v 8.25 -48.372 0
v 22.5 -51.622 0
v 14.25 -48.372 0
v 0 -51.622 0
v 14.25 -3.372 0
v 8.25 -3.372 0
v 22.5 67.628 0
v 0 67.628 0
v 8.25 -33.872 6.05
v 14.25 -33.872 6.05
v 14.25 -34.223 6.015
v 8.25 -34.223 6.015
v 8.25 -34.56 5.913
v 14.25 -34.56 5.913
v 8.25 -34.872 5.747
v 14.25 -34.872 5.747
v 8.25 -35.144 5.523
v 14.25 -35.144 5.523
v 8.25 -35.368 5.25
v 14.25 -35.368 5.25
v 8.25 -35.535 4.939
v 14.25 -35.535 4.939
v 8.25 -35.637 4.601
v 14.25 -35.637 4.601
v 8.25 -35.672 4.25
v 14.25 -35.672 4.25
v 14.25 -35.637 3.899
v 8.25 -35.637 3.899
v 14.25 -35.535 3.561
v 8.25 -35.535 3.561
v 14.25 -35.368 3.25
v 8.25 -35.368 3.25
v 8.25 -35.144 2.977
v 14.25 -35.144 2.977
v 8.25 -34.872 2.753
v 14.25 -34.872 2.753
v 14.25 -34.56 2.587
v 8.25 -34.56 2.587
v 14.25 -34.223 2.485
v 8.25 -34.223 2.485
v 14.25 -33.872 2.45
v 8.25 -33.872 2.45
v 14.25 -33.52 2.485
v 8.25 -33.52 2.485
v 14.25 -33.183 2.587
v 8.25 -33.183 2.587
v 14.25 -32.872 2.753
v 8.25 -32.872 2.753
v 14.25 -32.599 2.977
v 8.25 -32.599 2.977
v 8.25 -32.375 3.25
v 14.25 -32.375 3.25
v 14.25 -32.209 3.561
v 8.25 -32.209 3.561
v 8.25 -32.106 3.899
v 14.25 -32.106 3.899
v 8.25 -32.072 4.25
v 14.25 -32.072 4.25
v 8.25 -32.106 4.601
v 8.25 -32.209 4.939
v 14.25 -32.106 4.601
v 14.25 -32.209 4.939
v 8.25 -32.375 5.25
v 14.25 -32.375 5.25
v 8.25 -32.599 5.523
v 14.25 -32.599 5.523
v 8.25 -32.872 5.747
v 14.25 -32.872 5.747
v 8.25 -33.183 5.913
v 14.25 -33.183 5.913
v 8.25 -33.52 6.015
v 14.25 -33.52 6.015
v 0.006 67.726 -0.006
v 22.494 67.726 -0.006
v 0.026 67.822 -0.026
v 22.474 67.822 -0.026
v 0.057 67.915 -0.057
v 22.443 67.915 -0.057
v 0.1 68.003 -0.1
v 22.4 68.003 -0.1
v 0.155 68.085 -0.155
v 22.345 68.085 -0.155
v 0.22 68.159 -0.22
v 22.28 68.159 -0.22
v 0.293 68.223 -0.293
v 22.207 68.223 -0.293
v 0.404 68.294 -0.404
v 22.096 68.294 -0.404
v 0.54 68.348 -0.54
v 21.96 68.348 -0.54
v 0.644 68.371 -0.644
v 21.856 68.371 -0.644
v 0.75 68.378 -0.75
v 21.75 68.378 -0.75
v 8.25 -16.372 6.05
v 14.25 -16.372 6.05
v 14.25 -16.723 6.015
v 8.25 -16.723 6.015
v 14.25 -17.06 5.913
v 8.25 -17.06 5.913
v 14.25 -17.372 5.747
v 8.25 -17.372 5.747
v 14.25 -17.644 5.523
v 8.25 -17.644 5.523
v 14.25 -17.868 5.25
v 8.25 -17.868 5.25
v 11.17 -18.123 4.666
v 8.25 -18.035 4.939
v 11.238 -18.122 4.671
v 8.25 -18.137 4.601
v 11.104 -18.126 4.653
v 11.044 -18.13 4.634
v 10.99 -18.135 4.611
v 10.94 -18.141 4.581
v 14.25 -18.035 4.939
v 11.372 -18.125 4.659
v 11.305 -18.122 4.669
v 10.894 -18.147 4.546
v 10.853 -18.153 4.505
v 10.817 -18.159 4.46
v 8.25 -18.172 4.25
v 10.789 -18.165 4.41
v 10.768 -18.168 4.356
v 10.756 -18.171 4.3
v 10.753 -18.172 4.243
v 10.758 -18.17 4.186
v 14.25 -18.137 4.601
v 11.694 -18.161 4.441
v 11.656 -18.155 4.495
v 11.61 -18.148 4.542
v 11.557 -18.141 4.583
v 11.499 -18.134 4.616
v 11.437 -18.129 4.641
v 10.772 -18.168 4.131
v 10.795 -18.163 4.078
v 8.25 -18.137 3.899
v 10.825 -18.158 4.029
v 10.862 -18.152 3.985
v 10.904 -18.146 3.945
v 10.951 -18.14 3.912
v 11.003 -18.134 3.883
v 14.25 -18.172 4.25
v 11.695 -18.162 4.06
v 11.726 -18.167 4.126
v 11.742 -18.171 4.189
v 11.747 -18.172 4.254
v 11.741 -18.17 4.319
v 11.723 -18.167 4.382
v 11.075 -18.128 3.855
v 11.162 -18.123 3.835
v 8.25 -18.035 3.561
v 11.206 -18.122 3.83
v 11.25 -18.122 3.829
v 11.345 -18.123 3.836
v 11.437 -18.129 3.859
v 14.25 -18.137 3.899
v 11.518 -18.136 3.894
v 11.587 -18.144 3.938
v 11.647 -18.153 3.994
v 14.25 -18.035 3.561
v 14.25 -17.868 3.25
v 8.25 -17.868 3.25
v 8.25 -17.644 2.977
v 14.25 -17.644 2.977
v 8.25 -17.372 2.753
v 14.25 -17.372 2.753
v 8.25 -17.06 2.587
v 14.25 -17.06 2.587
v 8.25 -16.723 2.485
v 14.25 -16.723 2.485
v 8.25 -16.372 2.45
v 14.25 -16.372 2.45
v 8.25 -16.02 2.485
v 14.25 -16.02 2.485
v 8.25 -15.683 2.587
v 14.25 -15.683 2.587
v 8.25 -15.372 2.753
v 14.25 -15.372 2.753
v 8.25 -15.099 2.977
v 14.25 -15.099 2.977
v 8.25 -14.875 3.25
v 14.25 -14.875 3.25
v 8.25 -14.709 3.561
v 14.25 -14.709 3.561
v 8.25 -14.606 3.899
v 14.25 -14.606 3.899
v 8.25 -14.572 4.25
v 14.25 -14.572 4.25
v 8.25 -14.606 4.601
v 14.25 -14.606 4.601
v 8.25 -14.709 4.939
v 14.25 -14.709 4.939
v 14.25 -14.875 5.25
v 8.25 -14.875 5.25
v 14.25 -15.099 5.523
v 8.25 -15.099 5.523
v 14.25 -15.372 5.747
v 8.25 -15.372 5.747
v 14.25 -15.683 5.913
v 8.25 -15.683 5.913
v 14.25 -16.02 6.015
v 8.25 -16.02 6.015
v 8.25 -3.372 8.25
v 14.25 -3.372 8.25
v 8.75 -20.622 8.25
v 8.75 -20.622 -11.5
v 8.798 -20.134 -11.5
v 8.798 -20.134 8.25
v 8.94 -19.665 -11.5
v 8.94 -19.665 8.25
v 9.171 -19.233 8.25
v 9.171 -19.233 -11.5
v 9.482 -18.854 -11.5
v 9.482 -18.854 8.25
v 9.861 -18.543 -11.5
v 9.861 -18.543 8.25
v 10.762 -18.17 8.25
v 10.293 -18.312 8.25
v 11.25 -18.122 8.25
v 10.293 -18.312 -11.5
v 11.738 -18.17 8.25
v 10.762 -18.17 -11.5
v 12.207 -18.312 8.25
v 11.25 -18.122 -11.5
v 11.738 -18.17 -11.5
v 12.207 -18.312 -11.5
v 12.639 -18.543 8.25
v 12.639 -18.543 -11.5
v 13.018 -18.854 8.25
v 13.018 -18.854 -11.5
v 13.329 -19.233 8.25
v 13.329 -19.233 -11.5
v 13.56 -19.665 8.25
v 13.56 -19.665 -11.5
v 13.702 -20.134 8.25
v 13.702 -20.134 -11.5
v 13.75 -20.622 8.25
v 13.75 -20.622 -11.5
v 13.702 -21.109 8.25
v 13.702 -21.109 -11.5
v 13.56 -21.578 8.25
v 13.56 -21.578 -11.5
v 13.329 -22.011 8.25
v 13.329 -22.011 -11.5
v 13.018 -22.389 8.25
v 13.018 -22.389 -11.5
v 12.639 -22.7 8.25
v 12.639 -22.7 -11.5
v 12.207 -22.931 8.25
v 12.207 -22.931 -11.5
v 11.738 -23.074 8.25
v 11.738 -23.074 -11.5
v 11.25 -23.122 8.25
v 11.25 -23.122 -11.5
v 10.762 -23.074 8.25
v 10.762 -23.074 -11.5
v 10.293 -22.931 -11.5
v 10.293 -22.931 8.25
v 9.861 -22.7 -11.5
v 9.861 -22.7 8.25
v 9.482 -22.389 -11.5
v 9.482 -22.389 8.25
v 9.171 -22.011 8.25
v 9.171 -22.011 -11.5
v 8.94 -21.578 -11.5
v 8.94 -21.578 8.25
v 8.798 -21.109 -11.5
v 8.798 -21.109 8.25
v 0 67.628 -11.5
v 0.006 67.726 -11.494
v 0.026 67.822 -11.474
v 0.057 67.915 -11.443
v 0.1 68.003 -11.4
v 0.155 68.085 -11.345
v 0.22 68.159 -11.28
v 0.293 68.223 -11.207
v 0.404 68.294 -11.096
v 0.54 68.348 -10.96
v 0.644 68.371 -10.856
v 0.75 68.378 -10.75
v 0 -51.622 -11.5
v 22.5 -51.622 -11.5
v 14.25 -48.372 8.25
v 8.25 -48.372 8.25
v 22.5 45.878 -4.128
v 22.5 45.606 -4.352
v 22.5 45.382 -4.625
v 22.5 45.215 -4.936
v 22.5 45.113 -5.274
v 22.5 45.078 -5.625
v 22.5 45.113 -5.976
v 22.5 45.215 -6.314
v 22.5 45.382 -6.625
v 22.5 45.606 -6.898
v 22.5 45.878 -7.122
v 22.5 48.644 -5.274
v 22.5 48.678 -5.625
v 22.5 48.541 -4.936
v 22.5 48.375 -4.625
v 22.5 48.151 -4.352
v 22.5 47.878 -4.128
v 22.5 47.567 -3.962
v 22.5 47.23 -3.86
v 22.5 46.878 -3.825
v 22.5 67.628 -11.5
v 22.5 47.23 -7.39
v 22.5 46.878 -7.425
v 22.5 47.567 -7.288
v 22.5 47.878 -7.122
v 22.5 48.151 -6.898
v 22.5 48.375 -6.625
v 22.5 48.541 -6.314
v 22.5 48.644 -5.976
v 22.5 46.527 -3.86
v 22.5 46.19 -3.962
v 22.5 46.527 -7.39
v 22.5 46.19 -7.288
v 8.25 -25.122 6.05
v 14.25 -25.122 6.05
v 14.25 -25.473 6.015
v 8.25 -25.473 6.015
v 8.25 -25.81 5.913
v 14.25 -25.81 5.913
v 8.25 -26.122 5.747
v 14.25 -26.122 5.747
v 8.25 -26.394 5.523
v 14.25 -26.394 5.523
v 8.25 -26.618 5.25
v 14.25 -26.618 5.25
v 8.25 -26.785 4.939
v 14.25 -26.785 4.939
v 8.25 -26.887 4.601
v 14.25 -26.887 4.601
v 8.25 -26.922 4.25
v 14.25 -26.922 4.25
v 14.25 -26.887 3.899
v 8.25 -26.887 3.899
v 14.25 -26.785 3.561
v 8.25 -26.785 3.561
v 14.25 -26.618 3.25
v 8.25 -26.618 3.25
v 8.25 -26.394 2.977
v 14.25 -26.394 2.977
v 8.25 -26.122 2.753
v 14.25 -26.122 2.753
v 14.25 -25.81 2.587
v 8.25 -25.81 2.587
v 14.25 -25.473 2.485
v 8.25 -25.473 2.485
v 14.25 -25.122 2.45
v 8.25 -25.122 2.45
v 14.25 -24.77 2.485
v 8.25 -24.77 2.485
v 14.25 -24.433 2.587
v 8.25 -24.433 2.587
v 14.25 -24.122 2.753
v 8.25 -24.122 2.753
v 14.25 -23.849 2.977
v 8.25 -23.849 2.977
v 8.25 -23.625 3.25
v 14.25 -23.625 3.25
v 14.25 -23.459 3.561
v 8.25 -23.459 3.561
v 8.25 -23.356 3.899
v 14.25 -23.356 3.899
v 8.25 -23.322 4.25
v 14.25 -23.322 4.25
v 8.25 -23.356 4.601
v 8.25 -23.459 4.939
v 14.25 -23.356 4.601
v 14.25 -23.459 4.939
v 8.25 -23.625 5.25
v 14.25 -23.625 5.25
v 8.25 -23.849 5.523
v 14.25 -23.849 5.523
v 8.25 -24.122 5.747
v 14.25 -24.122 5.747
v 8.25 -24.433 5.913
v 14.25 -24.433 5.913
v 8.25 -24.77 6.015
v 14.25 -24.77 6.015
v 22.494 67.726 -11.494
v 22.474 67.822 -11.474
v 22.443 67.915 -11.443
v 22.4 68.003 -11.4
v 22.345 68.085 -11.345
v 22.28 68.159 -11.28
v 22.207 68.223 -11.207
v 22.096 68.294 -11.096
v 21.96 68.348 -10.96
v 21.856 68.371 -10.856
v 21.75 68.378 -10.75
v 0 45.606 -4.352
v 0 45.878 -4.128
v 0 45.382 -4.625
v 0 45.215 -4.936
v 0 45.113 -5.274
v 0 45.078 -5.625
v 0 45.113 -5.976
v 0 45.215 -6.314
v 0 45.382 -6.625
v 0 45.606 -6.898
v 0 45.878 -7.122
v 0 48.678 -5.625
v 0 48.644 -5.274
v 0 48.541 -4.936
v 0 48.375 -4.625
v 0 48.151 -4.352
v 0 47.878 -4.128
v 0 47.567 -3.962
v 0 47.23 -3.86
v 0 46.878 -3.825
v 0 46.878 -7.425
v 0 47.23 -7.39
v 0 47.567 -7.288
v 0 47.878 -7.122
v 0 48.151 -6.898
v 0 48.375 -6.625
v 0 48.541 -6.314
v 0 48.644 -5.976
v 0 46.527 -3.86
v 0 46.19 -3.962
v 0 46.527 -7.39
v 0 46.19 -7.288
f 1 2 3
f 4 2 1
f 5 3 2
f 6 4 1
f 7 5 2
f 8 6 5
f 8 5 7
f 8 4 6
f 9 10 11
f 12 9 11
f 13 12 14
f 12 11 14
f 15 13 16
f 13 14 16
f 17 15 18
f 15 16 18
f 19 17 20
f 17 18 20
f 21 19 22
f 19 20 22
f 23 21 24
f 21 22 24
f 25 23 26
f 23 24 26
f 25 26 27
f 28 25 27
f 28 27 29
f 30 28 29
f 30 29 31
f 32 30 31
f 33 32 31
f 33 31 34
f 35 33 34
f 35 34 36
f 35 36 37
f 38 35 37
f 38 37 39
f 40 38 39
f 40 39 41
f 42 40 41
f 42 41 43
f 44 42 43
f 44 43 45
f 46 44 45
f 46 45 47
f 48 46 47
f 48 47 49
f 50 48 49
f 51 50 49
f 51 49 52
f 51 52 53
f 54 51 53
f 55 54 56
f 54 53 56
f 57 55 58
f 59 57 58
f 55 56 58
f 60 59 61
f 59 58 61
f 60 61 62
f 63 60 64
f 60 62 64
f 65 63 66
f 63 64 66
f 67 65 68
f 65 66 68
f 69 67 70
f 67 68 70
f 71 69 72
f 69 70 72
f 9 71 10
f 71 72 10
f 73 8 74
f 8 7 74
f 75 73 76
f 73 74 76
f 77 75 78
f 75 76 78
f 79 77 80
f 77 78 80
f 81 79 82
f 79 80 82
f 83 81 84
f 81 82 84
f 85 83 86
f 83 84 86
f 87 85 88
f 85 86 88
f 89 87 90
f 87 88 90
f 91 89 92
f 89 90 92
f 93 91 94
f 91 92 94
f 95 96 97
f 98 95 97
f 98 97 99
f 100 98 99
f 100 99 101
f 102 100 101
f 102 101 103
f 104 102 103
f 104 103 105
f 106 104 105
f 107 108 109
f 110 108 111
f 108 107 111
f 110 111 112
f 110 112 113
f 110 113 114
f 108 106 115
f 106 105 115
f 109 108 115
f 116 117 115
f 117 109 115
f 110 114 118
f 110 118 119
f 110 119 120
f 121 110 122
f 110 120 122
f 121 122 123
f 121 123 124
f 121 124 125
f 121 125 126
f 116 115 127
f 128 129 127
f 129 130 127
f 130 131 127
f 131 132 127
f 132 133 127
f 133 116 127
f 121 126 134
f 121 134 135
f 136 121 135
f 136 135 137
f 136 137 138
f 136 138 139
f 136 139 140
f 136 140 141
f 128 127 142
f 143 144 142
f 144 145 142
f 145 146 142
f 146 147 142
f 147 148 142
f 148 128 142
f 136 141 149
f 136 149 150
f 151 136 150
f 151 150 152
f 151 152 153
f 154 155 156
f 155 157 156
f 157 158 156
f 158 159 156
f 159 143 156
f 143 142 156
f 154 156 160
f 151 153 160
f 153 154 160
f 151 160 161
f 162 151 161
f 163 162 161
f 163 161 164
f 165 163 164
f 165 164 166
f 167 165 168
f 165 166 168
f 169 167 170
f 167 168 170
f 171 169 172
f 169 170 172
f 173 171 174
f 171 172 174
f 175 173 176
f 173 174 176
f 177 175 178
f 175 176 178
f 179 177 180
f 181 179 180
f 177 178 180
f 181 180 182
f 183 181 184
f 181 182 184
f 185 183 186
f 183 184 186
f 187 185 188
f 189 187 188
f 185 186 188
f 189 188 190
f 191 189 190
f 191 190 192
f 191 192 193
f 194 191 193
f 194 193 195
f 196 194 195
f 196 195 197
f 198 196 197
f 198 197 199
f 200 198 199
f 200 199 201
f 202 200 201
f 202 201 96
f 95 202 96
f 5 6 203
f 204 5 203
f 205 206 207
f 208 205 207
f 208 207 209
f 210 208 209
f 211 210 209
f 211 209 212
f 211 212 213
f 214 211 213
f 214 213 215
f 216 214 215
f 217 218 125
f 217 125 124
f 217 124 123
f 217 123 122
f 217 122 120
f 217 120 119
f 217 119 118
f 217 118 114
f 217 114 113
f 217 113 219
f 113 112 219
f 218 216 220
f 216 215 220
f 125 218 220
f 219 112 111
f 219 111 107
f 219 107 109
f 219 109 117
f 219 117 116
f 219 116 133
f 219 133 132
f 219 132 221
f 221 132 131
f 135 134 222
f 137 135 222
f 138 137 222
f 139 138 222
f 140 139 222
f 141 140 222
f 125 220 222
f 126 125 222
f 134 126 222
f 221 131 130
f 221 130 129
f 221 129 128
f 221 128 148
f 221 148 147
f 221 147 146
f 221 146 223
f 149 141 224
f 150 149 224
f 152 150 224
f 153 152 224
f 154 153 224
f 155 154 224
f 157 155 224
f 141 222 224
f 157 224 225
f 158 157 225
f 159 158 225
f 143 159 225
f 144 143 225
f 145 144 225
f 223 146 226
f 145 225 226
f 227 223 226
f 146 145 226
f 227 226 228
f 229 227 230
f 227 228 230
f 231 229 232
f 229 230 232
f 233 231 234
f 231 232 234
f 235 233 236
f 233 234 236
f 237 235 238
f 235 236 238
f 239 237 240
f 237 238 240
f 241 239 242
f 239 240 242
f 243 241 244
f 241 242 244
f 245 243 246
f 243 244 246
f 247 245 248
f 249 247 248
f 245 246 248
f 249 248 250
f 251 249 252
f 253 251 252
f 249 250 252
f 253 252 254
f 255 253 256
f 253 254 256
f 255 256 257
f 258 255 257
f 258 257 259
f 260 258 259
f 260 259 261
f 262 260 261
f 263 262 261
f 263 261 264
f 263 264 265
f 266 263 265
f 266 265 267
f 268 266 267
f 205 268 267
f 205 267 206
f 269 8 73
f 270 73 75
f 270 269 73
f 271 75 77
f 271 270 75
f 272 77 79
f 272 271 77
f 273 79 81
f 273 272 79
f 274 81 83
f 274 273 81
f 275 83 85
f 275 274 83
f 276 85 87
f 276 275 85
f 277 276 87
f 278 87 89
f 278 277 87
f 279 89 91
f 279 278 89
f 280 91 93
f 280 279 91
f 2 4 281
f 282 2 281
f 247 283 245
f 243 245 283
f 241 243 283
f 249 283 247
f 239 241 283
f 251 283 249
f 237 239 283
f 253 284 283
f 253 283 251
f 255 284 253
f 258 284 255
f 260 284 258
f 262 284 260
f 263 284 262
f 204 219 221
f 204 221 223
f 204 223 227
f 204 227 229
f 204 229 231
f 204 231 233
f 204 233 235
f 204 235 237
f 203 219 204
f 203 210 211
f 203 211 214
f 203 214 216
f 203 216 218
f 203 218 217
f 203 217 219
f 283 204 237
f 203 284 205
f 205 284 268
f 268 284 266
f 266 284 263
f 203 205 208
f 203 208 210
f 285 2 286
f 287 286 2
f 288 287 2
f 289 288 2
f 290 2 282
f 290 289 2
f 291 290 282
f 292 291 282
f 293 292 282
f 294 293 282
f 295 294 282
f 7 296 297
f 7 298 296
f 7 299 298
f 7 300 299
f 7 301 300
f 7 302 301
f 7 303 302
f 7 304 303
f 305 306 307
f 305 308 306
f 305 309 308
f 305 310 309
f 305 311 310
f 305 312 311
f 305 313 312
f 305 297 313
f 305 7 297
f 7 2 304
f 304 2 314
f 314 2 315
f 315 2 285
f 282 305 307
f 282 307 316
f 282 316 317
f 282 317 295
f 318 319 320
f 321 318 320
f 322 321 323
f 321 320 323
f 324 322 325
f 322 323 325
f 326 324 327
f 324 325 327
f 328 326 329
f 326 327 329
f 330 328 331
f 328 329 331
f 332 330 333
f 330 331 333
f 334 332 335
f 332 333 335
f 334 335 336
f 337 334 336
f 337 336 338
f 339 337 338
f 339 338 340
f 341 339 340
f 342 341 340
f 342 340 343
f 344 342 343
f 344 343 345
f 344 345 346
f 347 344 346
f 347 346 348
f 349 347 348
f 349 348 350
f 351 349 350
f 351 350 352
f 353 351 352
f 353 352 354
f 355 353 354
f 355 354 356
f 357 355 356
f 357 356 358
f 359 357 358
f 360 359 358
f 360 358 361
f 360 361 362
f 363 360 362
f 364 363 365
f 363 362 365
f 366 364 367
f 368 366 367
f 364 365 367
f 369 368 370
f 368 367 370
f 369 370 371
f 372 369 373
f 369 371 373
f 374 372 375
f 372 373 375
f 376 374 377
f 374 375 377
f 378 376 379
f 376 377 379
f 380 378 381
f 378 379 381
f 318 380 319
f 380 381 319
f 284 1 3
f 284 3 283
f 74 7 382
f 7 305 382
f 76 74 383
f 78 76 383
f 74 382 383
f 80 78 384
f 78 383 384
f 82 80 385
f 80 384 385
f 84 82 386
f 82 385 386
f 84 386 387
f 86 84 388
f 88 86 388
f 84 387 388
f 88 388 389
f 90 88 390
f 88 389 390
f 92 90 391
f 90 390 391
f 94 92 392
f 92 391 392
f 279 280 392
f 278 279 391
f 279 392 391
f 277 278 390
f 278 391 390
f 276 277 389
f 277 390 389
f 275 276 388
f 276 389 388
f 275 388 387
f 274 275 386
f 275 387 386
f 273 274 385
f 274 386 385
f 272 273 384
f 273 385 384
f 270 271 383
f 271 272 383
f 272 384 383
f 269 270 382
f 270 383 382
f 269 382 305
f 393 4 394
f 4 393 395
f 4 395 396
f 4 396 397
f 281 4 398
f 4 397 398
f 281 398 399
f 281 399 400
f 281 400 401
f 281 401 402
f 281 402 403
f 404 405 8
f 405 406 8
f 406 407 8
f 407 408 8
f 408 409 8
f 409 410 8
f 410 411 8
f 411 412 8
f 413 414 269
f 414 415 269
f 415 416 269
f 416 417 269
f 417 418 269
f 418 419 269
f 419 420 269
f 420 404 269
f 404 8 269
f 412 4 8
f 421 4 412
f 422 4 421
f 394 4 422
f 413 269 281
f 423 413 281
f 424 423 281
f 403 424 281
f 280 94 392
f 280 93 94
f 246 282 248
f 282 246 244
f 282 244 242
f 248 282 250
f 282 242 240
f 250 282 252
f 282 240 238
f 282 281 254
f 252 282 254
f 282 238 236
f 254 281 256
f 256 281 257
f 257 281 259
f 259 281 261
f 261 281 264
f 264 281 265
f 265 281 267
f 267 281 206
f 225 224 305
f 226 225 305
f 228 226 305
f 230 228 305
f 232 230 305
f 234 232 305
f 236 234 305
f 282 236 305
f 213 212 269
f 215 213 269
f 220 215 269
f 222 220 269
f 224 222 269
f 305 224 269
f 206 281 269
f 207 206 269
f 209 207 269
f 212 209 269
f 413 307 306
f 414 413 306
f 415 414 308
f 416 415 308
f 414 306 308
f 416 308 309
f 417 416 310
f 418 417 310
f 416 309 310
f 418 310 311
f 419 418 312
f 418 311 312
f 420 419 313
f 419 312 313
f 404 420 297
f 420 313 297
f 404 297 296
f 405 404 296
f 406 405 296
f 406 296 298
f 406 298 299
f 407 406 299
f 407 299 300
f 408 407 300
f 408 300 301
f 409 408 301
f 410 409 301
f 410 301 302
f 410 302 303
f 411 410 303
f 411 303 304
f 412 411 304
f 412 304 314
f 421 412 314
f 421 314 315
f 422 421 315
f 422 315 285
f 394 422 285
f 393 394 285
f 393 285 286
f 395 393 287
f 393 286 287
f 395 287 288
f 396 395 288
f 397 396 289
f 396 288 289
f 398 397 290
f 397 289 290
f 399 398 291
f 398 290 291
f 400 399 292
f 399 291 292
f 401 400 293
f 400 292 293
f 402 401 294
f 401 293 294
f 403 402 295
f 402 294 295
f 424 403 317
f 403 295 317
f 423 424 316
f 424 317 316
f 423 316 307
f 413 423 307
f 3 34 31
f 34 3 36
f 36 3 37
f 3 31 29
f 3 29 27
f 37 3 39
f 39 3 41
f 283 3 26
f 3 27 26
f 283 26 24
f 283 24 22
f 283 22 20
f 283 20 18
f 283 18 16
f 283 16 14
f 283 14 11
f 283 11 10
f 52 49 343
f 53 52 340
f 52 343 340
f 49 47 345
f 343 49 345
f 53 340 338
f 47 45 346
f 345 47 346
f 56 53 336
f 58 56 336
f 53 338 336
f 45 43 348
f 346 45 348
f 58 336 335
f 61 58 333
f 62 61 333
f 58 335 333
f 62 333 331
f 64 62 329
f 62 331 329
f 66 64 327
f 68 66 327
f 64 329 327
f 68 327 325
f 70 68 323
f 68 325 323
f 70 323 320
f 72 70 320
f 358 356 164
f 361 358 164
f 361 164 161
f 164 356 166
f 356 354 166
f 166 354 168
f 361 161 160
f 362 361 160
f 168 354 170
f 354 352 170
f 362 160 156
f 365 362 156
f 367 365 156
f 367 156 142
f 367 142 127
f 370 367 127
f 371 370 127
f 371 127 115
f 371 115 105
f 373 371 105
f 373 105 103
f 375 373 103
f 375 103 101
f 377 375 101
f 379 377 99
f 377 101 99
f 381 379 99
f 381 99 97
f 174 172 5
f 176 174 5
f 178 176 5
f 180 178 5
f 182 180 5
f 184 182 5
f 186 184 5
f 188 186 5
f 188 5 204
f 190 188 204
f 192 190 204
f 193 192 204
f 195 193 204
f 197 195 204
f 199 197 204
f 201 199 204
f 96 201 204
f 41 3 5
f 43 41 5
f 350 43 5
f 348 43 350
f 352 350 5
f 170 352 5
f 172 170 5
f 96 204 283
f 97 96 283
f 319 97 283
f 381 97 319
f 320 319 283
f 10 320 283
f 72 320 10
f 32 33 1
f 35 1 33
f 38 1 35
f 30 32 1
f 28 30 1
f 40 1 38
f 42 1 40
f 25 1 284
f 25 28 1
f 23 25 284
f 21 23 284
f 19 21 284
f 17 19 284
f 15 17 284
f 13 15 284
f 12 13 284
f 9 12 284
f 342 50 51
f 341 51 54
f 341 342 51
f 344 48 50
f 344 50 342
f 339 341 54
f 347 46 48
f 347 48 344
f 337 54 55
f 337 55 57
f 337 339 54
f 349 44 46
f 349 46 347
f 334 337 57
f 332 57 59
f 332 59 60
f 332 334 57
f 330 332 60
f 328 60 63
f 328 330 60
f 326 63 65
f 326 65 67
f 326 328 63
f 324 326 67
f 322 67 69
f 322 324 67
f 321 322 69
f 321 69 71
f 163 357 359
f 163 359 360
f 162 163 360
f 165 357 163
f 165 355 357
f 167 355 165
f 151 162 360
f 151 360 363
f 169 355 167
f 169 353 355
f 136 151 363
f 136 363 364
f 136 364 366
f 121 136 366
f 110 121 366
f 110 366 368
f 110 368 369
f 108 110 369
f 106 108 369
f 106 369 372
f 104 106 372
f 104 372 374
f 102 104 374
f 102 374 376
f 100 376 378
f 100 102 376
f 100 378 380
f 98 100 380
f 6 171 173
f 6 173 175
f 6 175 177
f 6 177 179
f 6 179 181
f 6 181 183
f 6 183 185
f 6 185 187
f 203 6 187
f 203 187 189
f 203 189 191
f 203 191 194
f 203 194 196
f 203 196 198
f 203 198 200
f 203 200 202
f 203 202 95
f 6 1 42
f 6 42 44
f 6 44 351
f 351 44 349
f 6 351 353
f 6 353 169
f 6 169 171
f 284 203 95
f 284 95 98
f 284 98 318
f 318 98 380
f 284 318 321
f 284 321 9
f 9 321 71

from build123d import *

# Parameters (mm, degrees)
ESBO_O1_W                = 11.5
ESBO_O1_H                = 120
RESSALTO_EXTRUS_O1_DEPTH = 22.5
ESBO_O5_W                = 8.25
ESBO_O5_H                = 45
RESSALTO_EXTRUS_O2_DEPTH = 6
ESBO_O7_R                = 1.8
CORTE_EXTRUS_O1_DEPTH    = 30
CORTE_EXTRUS_O3_REACH    = 76.645
ESBO_O10_R               = 2.5
FILLET1_R                = 0.75


with BuildPart() as part:
    # Esboço1 → Ressalto-extrusão1 (new body)
    with BuildSketch(Plane(origin=(0, 0, 0), x_dir=(0, 0, -1), z_dir=(1, 0, 0))):
        with Locations((5.75, 8.378378378)):
            Rectangle(ESBO_O1_W, ESBO_O1_H)
    extrude(amount=RESSALTO_EXTRUS_O1_DEPTH)

    # Esboço5 → Ressalto-extrusão2 (add)
    with BuildSketch(Plane.ZY.offset(-8.25)):
        with Locations((4.125, -25.871621622)):
            Rectangle(ESBO_O5_W, ESBO_O5_H)
    extrude(amount=-RESSALTO_EXTRUS_O2_DEPTH)

    # Esboço7 → Corte-extrusão1 (cut)
    with BuildSketch(Plane(origin=(22.5, 0, 0), x_dir=(0, 0, -1), z_dir=(1, 0, 0))):
        with Locations((5.625, 46.878378378)):
            Circle(ESBO_O7_R)
        with Locations(Location((-4.25, -33.871621622, 0), (0, 0, 180))):
            Circle(ESBO_O7_R)
        with Locations(Location((-4.25, -25.121621622, 0), (0, 0, 180))):
            Circle(ESBO_O7_R)
        with Locations(Location((-4.25, -16.371621622, 0), (0, 0, 180))):
            Circle(ESBO_O7_R)
    extrude(amount=-CORTE_EXTRUS_O1_DEPTH, mode=Mode.SUBTRACT)

    # Corte-extrusão3: up to this face of the body (flat: up to its plane)
    corte_extrus_o3_end = Plane(part.part.faces().sort_by_distance((11.25, -25.871621622, 8.25))[0])
    # Esboço10 → Corte-extrusão3 (cut, up to the picked face)
    with BuildSketch(Plane(origin=(0, 0, -11.5), x_dir=(-1, 0, 0), z_dir=(0, 0, -1)), mode=Mode.PRIVATE) as corte_extrus_o3_sk1:
        with Locations((-11.25, -20.621621622)):
            Circle(ESBO_O10_R)
    corte_extrus_o3_tool1 = split(extrude(corte_extrus_o3_sk1.sketch, amount=-CORTE_EXTRUS_O3_REACH, mode=Mode.PRIVATE), bisect_by=corte_extrus_o3_end, keep=Keep.BOTH, mode=Mode.PRIVATE)
    add(corte_extrus_o3_tool1.solids().sort_by(Axis((11.25, -20.621622, -11.5), (0, 0, 1)))[0], mode=Mode.SUBTRACT)

    # Fillet1
    fillet1_edges = [part.edges().sort_by_distance(p)[0] for p in [
        (22.5, 68.378378378, -5.75),
        (0, 68.378378378, -5.75),
        (11.25, 68.378378378, -11.5),
        (11.25, 68.378378378, 0),
    ]]
    fillet(fillet1_edges, radius=FILLET1_R)


solid = part.part
